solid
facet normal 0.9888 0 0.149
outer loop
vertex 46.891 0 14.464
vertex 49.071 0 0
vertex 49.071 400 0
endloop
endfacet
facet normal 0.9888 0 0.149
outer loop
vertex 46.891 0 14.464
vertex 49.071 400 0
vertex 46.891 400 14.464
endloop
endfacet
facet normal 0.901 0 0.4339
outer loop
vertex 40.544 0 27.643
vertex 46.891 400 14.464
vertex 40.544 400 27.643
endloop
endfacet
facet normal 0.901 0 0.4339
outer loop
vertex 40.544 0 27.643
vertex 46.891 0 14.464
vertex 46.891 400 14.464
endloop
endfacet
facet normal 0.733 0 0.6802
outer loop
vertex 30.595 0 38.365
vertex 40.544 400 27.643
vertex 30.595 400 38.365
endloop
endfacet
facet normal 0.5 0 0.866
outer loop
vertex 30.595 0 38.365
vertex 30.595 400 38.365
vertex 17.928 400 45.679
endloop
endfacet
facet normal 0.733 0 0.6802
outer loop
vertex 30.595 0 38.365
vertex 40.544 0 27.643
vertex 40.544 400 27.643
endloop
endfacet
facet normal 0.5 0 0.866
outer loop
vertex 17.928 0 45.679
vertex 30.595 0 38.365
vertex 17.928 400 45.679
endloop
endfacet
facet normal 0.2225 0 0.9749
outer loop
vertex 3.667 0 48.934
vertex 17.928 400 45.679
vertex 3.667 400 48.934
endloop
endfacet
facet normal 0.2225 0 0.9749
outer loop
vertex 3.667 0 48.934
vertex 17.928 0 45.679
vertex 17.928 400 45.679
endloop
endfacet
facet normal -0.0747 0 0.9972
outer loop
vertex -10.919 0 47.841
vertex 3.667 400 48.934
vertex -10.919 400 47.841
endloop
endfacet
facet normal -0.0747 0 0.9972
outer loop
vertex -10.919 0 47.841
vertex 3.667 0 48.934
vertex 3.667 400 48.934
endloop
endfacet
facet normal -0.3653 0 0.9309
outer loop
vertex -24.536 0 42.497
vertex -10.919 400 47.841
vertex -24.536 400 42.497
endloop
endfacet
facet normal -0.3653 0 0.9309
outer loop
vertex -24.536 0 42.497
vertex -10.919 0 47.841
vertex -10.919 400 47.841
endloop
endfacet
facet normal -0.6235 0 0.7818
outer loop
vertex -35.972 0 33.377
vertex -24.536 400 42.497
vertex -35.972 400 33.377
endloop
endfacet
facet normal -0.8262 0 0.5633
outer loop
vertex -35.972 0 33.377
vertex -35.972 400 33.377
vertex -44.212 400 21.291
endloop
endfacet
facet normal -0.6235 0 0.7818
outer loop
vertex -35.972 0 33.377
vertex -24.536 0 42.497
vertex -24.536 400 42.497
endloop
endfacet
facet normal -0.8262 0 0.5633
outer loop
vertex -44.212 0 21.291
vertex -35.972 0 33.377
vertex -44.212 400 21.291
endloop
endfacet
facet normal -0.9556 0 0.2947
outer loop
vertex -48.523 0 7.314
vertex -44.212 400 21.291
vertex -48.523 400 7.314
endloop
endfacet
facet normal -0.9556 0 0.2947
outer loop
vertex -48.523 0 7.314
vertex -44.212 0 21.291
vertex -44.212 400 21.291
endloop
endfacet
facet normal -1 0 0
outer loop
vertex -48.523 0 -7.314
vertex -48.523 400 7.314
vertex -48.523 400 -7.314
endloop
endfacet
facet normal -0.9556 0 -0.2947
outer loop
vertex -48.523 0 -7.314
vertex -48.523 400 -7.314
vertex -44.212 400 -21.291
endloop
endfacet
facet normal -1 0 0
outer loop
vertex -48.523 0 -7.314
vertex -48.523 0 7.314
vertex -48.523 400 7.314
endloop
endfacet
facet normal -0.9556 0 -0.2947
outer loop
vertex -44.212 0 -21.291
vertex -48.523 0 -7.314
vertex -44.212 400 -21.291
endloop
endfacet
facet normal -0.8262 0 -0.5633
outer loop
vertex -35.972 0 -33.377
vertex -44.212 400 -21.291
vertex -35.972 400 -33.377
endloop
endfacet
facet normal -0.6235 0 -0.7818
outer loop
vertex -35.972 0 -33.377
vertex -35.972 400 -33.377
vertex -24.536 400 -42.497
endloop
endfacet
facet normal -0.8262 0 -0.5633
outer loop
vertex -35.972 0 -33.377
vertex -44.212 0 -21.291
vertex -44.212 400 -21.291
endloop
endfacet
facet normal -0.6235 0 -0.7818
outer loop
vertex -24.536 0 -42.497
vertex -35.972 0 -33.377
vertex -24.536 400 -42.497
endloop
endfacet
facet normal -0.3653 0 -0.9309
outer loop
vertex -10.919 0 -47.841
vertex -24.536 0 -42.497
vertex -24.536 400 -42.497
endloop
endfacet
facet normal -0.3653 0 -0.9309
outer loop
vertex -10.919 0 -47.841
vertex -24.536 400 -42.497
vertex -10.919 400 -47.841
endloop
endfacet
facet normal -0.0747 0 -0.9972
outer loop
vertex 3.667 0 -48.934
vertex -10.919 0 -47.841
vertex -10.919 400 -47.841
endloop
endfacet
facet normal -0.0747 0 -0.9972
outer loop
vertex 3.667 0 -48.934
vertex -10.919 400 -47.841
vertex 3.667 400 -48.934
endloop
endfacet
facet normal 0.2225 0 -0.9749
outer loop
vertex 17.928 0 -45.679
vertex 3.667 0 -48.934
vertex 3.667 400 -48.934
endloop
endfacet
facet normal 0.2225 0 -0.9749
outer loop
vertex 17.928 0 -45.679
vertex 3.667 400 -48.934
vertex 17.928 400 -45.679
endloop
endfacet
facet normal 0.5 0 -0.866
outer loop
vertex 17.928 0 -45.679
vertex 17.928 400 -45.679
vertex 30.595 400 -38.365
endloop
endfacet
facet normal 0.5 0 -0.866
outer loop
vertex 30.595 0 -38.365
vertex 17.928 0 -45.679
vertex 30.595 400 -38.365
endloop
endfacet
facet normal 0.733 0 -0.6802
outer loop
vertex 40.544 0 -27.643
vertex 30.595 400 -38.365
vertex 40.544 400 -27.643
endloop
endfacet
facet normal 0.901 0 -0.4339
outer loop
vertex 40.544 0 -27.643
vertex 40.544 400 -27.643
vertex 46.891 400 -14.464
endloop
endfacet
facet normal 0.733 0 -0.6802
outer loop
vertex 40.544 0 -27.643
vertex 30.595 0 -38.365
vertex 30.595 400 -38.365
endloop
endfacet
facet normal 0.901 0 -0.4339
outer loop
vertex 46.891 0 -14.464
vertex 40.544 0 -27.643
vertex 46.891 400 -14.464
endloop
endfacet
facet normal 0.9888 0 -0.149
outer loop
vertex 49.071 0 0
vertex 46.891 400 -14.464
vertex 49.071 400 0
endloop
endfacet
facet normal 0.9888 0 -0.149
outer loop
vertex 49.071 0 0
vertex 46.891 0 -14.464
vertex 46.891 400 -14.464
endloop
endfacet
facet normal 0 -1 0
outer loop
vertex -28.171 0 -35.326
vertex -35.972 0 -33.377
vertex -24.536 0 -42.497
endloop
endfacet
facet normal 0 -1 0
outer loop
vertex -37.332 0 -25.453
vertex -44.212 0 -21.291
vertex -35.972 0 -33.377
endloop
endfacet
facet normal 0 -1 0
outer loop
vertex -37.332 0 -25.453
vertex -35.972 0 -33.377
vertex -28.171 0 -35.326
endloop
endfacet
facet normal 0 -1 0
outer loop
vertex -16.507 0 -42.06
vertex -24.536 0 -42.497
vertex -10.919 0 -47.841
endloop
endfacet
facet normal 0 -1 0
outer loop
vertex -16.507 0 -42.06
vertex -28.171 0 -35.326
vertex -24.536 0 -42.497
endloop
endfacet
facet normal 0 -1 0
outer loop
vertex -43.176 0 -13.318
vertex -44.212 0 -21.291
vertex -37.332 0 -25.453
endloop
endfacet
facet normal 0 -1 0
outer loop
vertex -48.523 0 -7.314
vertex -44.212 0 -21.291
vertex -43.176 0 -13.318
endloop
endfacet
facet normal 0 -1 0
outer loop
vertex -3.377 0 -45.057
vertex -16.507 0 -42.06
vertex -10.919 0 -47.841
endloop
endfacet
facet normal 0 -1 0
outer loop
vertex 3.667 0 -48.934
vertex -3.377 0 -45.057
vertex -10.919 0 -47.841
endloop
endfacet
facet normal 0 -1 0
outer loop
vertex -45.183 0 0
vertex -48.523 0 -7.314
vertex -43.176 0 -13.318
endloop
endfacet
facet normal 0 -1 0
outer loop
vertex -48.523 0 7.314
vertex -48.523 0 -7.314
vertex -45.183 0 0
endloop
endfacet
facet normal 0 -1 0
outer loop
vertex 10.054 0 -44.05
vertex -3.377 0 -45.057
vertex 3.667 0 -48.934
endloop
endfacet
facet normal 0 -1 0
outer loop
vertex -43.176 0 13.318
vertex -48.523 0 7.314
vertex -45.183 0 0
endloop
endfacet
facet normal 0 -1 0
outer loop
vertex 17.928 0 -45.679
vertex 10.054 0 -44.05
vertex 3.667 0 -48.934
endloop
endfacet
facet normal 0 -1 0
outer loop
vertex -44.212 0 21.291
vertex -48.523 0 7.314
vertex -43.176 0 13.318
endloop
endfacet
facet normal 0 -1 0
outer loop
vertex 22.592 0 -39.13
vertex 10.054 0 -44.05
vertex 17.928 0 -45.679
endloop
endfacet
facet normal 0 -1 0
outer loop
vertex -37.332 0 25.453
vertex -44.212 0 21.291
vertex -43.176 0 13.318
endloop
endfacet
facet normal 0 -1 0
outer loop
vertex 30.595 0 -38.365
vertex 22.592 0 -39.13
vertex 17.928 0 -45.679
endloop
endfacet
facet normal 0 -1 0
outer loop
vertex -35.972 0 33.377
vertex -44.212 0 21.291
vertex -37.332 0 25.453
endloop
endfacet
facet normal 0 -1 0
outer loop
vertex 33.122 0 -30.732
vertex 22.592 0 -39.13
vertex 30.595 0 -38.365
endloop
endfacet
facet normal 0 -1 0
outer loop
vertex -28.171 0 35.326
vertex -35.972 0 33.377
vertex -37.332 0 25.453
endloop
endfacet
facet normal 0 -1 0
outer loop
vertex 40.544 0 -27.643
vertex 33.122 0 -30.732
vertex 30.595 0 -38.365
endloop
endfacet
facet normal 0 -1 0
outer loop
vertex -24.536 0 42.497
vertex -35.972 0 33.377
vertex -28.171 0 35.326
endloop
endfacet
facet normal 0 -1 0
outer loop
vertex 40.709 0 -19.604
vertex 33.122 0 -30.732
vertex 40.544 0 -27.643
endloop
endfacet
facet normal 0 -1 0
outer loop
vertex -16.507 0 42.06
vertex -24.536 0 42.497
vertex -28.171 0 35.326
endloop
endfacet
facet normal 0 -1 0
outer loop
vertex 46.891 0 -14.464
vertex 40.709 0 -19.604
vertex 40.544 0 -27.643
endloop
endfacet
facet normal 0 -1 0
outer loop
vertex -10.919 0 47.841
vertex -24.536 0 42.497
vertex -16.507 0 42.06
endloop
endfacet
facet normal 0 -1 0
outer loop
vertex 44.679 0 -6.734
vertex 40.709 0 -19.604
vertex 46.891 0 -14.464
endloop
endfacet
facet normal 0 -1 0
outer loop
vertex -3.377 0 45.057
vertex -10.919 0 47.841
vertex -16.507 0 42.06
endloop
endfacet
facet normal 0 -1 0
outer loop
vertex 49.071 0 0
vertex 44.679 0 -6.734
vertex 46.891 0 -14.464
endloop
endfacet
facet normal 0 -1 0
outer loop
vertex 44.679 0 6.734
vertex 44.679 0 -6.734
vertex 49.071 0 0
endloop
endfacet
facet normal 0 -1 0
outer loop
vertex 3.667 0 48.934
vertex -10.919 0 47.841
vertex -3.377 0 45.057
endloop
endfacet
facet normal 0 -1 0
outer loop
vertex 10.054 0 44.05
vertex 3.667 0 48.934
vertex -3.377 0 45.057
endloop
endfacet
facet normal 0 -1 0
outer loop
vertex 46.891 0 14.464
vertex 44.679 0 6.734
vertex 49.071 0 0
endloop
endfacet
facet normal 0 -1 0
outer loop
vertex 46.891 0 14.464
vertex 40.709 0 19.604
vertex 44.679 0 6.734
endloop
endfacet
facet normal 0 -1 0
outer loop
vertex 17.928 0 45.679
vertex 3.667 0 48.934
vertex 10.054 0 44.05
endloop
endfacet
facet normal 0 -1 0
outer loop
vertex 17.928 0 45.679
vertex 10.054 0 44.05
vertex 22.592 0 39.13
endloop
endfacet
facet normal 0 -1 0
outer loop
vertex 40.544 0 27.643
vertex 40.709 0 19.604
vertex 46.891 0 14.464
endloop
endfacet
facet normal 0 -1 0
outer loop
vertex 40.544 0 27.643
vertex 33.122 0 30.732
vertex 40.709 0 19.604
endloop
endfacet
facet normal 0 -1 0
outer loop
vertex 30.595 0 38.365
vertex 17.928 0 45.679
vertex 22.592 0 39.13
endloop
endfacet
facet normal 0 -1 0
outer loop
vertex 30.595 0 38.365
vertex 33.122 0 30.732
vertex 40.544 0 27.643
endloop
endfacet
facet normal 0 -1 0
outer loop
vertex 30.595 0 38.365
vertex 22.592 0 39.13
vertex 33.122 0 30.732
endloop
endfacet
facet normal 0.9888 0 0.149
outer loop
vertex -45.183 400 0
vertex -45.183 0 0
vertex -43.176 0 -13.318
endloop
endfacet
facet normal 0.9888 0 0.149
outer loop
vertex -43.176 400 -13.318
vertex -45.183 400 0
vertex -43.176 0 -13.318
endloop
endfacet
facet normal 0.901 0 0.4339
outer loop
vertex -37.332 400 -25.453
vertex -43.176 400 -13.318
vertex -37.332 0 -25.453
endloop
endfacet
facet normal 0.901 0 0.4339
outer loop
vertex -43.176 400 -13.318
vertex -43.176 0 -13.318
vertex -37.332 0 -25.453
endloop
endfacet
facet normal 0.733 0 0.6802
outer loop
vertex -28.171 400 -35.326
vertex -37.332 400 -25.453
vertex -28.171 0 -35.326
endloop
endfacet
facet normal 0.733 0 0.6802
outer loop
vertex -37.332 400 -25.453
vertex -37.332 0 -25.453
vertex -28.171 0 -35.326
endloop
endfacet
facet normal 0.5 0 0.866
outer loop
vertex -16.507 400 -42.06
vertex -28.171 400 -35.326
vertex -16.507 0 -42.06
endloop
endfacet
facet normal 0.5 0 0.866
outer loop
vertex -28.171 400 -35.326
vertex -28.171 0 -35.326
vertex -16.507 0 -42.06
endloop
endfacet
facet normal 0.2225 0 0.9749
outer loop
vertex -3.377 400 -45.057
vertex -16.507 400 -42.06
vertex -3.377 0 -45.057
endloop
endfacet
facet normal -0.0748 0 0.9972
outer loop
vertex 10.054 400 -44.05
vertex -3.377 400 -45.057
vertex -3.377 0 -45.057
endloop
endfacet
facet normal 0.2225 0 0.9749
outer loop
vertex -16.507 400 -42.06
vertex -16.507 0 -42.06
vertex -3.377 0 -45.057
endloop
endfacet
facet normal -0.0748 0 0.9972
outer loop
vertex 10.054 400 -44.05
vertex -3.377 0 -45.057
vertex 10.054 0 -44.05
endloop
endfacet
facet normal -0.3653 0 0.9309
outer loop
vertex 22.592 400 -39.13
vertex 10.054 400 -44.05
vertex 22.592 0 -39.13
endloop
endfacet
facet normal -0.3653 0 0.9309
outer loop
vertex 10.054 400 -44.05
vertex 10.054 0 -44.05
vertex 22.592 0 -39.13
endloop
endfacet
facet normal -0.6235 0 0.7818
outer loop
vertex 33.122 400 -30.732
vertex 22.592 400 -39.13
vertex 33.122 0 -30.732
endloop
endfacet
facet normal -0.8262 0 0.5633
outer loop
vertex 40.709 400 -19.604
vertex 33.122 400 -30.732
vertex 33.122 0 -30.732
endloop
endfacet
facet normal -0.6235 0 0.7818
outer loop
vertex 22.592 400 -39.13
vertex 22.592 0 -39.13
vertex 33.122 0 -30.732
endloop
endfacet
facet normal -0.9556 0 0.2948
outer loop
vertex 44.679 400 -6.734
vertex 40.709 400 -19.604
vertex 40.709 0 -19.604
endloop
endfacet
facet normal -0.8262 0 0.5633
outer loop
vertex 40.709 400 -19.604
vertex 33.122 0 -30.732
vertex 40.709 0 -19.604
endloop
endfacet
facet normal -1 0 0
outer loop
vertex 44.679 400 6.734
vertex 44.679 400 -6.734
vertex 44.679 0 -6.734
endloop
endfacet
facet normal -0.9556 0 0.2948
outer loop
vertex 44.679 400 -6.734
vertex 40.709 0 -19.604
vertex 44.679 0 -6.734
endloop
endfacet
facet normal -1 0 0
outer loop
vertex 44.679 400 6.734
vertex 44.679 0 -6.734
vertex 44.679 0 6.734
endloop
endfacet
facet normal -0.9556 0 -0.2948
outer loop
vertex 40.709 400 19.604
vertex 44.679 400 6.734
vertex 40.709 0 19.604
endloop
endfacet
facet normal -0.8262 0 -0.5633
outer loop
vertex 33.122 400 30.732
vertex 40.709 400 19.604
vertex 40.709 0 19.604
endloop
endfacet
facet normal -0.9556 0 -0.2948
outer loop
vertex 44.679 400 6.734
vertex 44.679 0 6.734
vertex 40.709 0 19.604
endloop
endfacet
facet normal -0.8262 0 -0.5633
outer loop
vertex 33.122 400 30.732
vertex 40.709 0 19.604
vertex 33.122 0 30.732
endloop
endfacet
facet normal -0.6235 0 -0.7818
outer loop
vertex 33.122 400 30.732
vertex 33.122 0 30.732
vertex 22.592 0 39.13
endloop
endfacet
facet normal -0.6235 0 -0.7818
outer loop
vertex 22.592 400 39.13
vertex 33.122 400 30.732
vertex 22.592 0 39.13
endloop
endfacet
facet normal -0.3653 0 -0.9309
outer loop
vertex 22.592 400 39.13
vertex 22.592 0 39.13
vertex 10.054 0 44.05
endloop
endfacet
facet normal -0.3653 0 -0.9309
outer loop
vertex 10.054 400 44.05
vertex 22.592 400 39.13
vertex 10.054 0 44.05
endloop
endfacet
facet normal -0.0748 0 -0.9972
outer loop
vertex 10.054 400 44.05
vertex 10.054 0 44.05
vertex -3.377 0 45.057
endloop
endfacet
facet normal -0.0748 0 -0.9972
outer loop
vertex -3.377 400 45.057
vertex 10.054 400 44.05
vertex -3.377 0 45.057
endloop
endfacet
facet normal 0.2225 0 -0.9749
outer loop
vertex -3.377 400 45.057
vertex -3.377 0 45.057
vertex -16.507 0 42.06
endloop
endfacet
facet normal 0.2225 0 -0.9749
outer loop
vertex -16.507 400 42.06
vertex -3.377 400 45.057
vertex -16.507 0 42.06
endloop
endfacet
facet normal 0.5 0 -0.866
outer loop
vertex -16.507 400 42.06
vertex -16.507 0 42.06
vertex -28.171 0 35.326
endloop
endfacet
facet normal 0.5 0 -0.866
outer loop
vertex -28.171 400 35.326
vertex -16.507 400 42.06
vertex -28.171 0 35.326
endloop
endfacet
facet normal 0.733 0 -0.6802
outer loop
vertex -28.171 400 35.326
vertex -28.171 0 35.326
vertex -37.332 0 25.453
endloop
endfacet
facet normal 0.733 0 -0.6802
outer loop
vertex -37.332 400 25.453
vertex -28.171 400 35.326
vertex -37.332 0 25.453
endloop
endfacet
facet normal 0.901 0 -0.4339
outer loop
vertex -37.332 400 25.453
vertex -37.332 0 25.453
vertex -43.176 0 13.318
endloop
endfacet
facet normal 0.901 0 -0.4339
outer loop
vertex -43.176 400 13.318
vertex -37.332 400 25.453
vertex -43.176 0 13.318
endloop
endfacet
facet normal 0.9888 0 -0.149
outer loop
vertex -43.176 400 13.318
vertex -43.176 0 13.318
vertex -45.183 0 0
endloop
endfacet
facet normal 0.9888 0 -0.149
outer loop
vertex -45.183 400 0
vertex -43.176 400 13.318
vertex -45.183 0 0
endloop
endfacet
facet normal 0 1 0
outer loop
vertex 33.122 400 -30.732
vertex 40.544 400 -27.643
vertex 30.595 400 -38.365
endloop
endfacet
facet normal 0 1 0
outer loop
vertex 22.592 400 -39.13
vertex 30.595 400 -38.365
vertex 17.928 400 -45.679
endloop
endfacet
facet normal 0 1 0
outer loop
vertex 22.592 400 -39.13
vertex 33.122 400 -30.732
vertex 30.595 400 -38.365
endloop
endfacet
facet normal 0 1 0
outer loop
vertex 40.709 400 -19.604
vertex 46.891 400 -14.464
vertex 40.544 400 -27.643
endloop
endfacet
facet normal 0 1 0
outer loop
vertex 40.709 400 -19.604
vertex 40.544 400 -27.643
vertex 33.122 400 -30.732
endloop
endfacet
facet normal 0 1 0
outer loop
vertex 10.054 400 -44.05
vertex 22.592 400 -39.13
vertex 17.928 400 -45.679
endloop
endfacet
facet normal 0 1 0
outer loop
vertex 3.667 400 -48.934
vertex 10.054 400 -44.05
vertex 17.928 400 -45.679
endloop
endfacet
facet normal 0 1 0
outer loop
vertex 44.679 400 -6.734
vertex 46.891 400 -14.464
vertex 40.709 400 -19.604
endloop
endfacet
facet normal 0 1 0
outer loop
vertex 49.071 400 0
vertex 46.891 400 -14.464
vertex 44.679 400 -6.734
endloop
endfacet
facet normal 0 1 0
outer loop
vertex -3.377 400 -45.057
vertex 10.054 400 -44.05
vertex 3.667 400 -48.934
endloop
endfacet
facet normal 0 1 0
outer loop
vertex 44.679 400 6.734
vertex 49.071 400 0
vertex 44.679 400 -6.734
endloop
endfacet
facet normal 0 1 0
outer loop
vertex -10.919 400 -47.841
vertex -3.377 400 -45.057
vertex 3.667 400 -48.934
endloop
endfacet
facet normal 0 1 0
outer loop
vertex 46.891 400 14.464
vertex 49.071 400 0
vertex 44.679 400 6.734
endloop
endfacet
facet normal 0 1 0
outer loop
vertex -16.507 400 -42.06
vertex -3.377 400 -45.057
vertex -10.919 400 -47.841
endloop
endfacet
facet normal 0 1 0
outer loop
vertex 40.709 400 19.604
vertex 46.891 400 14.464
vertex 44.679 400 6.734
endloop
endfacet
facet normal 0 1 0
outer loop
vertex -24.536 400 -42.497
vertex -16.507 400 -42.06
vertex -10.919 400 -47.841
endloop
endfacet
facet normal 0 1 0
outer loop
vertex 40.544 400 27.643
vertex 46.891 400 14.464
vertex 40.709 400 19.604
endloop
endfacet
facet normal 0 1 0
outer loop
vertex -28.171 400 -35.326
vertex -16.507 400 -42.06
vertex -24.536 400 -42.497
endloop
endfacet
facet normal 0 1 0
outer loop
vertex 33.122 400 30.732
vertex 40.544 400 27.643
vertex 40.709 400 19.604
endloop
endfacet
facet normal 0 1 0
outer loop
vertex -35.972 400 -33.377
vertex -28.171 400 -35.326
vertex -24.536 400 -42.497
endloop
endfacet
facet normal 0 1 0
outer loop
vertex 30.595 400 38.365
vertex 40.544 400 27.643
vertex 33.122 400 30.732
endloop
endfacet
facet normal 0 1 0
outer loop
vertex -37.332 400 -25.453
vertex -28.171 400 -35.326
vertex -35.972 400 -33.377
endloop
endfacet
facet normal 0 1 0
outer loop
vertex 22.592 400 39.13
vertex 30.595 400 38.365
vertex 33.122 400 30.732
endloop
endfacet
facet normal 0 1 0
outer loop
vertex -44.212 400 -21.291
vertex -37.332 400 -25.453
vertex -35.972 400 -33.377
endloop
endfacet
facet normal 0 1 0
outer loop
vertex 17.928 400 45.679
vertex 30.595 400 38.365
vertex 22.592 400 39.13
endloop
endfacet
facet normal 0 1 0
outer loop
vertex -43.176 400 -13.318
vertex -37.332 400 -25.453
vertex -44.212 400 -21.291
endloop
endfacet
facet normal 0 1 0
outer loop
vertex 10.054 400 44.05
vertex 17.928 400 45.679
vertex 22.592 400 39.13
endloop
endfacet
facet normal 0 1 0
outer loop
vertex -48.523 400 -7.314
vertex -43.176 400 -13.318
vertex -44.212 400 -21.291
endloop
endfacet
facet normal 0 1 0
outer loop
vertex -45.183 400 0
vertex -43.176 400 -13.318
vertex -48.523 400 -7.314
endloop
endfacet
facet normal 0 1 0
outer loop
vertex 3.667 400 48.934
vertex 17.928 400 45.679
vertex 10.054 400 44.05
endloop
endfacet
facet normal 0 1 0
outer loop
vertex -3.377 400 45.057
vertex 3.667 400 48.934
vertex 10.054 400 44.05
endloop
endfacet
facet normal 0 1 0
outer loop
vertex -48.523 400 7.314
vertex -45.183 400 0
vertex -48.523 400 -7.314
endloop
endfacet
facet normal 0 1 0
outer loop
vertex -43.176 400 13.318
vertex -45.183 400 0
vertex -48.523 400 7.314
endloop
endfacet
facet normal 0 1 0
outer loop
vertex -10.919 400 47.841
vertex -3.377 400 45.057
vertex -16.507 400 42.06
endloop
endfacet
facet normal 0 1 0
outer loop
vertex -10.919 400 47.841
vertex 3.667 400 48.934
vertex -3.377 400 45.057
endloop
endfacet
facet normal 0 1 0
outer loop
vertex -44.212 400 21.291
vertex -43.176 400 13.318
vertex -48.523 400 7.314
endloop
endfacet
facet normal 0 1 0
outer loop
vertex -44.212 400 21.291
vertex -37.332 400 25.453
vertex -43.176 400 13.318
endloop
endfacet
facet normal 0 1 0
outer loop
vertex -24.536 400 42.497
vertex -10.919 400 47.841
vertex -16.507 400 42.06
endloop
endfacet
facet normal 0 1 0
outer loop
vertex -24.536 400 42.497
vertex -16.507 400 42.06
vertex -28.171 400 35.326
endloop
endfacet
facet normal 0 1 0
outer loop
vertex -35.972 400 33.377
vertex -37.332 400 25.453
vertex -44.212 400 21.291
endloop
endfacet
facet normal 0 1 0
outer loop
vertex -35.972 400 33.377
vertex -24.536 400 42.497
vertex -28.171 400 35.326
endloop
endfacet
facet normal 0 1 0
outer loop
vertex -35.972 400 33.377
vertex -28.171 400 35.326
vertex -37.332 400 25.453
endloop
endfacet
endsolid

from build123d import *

# Parameters (mm, degrees)
F0_R      = 49.071094
F1_DEPTH  = 400
F2_R      = 45.183213
F3_DEPTH  = 408.94
F3_FACE_R = 45.183213
F4_DEPTH  = 500.38


with BuildPart() as f1:
    # F0 (on Front) → F1 (new body)
    with BuildSketch(Plane.XZ):
        Circle(F0_R)
    extrude(amount=-F1_DEPTH)

    # F2 (on face) → F3 (join)
    with BuildSketch(Plane(origin=(0, 400, 0), x_dir=(-1, 0, 0), z_dir=(0, 1, 0))):
        Circle(F2_R)
    extrude(amount=-F3_DEPTH)

    # F3_face (on face) → F4 (cut)
    with BuildSketch(Plane(origin=(0, -8.94, 0), x_dir=(-1, 0, 0), z_dir=(0, -1, 0))):
        Circle(F3_FACE_R)
    extrude(amount=-F4_DEPTH, mode=Mode.SUBTRACT)


solid = f1.part
